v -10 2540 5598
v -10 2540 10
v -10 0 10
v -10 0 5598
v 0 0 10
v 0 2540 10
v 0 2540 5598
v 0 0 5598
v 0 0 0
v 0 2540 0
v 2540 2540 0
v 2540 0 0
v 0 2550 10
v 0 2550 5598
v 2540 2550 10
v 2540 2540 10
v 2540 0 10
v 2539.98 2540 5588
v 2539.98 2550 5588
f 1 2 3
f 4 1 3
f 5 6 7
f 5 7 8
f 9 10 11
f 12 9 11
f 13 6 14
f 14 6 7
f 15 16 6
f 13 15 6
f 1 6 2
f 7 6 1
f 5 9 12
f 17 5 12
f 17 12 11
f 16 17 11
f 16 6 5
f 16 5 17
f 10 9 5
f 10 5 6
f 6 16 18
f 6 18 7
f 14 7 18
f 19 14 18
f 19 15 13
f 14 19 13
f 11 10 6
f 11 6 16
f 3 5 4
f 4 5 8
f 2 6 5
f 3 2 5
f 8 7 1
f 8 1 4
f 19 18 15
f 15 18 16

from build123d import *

# Parameters (mm, degrees)
F0_W     = 2540
F0_H     = 2540
F1_DEPTH = 10
F2_W     = 2540
F2_H     = 5588
F3_DEPTH = 10
F5_DEPTH = 10


# Not quite as in the source:
# - ends of sketch curves that miss each other by under 0.0002 mm in the source are joined


with BuildPart() as f1:
    # F0 (on Top) → F1 (new body)
    with BuildSketch(Plane.XY):
        with Locations((1270, 1270)):
            Rectangle(F0_W, F0_H)
    extrude(amount=F1_DEPTH)


with BuildPart() as f3:
    # F2 (on face) → F3 (new body)
    with BuildSketch(Plane(origin=(0, 0, 0), x_dir=(0, -1, 0), z_dir=(-1, 0, 0))):
        with Locations((-1270, 2804)):
            Rectangle(F2_W, F2_H)
    extrude(amount=F3_DEPTH)


with BuildPart() as f5:
    # F4 (on face) → F5 (new body)
    with BuildSketch(Plane(origin=(0, 2540, 0), x_dir=(-1, 0, 0), z_dir=(0, 1, 0))):
        Polygon((-2540, 10), (0, 10), (0, 5598), (-2539.9803148842, 5587.9999999653), align=None)
    extrude(amount=F5_DEPTH)


solid = Compound([f1.part, f3.part, f5.part])
